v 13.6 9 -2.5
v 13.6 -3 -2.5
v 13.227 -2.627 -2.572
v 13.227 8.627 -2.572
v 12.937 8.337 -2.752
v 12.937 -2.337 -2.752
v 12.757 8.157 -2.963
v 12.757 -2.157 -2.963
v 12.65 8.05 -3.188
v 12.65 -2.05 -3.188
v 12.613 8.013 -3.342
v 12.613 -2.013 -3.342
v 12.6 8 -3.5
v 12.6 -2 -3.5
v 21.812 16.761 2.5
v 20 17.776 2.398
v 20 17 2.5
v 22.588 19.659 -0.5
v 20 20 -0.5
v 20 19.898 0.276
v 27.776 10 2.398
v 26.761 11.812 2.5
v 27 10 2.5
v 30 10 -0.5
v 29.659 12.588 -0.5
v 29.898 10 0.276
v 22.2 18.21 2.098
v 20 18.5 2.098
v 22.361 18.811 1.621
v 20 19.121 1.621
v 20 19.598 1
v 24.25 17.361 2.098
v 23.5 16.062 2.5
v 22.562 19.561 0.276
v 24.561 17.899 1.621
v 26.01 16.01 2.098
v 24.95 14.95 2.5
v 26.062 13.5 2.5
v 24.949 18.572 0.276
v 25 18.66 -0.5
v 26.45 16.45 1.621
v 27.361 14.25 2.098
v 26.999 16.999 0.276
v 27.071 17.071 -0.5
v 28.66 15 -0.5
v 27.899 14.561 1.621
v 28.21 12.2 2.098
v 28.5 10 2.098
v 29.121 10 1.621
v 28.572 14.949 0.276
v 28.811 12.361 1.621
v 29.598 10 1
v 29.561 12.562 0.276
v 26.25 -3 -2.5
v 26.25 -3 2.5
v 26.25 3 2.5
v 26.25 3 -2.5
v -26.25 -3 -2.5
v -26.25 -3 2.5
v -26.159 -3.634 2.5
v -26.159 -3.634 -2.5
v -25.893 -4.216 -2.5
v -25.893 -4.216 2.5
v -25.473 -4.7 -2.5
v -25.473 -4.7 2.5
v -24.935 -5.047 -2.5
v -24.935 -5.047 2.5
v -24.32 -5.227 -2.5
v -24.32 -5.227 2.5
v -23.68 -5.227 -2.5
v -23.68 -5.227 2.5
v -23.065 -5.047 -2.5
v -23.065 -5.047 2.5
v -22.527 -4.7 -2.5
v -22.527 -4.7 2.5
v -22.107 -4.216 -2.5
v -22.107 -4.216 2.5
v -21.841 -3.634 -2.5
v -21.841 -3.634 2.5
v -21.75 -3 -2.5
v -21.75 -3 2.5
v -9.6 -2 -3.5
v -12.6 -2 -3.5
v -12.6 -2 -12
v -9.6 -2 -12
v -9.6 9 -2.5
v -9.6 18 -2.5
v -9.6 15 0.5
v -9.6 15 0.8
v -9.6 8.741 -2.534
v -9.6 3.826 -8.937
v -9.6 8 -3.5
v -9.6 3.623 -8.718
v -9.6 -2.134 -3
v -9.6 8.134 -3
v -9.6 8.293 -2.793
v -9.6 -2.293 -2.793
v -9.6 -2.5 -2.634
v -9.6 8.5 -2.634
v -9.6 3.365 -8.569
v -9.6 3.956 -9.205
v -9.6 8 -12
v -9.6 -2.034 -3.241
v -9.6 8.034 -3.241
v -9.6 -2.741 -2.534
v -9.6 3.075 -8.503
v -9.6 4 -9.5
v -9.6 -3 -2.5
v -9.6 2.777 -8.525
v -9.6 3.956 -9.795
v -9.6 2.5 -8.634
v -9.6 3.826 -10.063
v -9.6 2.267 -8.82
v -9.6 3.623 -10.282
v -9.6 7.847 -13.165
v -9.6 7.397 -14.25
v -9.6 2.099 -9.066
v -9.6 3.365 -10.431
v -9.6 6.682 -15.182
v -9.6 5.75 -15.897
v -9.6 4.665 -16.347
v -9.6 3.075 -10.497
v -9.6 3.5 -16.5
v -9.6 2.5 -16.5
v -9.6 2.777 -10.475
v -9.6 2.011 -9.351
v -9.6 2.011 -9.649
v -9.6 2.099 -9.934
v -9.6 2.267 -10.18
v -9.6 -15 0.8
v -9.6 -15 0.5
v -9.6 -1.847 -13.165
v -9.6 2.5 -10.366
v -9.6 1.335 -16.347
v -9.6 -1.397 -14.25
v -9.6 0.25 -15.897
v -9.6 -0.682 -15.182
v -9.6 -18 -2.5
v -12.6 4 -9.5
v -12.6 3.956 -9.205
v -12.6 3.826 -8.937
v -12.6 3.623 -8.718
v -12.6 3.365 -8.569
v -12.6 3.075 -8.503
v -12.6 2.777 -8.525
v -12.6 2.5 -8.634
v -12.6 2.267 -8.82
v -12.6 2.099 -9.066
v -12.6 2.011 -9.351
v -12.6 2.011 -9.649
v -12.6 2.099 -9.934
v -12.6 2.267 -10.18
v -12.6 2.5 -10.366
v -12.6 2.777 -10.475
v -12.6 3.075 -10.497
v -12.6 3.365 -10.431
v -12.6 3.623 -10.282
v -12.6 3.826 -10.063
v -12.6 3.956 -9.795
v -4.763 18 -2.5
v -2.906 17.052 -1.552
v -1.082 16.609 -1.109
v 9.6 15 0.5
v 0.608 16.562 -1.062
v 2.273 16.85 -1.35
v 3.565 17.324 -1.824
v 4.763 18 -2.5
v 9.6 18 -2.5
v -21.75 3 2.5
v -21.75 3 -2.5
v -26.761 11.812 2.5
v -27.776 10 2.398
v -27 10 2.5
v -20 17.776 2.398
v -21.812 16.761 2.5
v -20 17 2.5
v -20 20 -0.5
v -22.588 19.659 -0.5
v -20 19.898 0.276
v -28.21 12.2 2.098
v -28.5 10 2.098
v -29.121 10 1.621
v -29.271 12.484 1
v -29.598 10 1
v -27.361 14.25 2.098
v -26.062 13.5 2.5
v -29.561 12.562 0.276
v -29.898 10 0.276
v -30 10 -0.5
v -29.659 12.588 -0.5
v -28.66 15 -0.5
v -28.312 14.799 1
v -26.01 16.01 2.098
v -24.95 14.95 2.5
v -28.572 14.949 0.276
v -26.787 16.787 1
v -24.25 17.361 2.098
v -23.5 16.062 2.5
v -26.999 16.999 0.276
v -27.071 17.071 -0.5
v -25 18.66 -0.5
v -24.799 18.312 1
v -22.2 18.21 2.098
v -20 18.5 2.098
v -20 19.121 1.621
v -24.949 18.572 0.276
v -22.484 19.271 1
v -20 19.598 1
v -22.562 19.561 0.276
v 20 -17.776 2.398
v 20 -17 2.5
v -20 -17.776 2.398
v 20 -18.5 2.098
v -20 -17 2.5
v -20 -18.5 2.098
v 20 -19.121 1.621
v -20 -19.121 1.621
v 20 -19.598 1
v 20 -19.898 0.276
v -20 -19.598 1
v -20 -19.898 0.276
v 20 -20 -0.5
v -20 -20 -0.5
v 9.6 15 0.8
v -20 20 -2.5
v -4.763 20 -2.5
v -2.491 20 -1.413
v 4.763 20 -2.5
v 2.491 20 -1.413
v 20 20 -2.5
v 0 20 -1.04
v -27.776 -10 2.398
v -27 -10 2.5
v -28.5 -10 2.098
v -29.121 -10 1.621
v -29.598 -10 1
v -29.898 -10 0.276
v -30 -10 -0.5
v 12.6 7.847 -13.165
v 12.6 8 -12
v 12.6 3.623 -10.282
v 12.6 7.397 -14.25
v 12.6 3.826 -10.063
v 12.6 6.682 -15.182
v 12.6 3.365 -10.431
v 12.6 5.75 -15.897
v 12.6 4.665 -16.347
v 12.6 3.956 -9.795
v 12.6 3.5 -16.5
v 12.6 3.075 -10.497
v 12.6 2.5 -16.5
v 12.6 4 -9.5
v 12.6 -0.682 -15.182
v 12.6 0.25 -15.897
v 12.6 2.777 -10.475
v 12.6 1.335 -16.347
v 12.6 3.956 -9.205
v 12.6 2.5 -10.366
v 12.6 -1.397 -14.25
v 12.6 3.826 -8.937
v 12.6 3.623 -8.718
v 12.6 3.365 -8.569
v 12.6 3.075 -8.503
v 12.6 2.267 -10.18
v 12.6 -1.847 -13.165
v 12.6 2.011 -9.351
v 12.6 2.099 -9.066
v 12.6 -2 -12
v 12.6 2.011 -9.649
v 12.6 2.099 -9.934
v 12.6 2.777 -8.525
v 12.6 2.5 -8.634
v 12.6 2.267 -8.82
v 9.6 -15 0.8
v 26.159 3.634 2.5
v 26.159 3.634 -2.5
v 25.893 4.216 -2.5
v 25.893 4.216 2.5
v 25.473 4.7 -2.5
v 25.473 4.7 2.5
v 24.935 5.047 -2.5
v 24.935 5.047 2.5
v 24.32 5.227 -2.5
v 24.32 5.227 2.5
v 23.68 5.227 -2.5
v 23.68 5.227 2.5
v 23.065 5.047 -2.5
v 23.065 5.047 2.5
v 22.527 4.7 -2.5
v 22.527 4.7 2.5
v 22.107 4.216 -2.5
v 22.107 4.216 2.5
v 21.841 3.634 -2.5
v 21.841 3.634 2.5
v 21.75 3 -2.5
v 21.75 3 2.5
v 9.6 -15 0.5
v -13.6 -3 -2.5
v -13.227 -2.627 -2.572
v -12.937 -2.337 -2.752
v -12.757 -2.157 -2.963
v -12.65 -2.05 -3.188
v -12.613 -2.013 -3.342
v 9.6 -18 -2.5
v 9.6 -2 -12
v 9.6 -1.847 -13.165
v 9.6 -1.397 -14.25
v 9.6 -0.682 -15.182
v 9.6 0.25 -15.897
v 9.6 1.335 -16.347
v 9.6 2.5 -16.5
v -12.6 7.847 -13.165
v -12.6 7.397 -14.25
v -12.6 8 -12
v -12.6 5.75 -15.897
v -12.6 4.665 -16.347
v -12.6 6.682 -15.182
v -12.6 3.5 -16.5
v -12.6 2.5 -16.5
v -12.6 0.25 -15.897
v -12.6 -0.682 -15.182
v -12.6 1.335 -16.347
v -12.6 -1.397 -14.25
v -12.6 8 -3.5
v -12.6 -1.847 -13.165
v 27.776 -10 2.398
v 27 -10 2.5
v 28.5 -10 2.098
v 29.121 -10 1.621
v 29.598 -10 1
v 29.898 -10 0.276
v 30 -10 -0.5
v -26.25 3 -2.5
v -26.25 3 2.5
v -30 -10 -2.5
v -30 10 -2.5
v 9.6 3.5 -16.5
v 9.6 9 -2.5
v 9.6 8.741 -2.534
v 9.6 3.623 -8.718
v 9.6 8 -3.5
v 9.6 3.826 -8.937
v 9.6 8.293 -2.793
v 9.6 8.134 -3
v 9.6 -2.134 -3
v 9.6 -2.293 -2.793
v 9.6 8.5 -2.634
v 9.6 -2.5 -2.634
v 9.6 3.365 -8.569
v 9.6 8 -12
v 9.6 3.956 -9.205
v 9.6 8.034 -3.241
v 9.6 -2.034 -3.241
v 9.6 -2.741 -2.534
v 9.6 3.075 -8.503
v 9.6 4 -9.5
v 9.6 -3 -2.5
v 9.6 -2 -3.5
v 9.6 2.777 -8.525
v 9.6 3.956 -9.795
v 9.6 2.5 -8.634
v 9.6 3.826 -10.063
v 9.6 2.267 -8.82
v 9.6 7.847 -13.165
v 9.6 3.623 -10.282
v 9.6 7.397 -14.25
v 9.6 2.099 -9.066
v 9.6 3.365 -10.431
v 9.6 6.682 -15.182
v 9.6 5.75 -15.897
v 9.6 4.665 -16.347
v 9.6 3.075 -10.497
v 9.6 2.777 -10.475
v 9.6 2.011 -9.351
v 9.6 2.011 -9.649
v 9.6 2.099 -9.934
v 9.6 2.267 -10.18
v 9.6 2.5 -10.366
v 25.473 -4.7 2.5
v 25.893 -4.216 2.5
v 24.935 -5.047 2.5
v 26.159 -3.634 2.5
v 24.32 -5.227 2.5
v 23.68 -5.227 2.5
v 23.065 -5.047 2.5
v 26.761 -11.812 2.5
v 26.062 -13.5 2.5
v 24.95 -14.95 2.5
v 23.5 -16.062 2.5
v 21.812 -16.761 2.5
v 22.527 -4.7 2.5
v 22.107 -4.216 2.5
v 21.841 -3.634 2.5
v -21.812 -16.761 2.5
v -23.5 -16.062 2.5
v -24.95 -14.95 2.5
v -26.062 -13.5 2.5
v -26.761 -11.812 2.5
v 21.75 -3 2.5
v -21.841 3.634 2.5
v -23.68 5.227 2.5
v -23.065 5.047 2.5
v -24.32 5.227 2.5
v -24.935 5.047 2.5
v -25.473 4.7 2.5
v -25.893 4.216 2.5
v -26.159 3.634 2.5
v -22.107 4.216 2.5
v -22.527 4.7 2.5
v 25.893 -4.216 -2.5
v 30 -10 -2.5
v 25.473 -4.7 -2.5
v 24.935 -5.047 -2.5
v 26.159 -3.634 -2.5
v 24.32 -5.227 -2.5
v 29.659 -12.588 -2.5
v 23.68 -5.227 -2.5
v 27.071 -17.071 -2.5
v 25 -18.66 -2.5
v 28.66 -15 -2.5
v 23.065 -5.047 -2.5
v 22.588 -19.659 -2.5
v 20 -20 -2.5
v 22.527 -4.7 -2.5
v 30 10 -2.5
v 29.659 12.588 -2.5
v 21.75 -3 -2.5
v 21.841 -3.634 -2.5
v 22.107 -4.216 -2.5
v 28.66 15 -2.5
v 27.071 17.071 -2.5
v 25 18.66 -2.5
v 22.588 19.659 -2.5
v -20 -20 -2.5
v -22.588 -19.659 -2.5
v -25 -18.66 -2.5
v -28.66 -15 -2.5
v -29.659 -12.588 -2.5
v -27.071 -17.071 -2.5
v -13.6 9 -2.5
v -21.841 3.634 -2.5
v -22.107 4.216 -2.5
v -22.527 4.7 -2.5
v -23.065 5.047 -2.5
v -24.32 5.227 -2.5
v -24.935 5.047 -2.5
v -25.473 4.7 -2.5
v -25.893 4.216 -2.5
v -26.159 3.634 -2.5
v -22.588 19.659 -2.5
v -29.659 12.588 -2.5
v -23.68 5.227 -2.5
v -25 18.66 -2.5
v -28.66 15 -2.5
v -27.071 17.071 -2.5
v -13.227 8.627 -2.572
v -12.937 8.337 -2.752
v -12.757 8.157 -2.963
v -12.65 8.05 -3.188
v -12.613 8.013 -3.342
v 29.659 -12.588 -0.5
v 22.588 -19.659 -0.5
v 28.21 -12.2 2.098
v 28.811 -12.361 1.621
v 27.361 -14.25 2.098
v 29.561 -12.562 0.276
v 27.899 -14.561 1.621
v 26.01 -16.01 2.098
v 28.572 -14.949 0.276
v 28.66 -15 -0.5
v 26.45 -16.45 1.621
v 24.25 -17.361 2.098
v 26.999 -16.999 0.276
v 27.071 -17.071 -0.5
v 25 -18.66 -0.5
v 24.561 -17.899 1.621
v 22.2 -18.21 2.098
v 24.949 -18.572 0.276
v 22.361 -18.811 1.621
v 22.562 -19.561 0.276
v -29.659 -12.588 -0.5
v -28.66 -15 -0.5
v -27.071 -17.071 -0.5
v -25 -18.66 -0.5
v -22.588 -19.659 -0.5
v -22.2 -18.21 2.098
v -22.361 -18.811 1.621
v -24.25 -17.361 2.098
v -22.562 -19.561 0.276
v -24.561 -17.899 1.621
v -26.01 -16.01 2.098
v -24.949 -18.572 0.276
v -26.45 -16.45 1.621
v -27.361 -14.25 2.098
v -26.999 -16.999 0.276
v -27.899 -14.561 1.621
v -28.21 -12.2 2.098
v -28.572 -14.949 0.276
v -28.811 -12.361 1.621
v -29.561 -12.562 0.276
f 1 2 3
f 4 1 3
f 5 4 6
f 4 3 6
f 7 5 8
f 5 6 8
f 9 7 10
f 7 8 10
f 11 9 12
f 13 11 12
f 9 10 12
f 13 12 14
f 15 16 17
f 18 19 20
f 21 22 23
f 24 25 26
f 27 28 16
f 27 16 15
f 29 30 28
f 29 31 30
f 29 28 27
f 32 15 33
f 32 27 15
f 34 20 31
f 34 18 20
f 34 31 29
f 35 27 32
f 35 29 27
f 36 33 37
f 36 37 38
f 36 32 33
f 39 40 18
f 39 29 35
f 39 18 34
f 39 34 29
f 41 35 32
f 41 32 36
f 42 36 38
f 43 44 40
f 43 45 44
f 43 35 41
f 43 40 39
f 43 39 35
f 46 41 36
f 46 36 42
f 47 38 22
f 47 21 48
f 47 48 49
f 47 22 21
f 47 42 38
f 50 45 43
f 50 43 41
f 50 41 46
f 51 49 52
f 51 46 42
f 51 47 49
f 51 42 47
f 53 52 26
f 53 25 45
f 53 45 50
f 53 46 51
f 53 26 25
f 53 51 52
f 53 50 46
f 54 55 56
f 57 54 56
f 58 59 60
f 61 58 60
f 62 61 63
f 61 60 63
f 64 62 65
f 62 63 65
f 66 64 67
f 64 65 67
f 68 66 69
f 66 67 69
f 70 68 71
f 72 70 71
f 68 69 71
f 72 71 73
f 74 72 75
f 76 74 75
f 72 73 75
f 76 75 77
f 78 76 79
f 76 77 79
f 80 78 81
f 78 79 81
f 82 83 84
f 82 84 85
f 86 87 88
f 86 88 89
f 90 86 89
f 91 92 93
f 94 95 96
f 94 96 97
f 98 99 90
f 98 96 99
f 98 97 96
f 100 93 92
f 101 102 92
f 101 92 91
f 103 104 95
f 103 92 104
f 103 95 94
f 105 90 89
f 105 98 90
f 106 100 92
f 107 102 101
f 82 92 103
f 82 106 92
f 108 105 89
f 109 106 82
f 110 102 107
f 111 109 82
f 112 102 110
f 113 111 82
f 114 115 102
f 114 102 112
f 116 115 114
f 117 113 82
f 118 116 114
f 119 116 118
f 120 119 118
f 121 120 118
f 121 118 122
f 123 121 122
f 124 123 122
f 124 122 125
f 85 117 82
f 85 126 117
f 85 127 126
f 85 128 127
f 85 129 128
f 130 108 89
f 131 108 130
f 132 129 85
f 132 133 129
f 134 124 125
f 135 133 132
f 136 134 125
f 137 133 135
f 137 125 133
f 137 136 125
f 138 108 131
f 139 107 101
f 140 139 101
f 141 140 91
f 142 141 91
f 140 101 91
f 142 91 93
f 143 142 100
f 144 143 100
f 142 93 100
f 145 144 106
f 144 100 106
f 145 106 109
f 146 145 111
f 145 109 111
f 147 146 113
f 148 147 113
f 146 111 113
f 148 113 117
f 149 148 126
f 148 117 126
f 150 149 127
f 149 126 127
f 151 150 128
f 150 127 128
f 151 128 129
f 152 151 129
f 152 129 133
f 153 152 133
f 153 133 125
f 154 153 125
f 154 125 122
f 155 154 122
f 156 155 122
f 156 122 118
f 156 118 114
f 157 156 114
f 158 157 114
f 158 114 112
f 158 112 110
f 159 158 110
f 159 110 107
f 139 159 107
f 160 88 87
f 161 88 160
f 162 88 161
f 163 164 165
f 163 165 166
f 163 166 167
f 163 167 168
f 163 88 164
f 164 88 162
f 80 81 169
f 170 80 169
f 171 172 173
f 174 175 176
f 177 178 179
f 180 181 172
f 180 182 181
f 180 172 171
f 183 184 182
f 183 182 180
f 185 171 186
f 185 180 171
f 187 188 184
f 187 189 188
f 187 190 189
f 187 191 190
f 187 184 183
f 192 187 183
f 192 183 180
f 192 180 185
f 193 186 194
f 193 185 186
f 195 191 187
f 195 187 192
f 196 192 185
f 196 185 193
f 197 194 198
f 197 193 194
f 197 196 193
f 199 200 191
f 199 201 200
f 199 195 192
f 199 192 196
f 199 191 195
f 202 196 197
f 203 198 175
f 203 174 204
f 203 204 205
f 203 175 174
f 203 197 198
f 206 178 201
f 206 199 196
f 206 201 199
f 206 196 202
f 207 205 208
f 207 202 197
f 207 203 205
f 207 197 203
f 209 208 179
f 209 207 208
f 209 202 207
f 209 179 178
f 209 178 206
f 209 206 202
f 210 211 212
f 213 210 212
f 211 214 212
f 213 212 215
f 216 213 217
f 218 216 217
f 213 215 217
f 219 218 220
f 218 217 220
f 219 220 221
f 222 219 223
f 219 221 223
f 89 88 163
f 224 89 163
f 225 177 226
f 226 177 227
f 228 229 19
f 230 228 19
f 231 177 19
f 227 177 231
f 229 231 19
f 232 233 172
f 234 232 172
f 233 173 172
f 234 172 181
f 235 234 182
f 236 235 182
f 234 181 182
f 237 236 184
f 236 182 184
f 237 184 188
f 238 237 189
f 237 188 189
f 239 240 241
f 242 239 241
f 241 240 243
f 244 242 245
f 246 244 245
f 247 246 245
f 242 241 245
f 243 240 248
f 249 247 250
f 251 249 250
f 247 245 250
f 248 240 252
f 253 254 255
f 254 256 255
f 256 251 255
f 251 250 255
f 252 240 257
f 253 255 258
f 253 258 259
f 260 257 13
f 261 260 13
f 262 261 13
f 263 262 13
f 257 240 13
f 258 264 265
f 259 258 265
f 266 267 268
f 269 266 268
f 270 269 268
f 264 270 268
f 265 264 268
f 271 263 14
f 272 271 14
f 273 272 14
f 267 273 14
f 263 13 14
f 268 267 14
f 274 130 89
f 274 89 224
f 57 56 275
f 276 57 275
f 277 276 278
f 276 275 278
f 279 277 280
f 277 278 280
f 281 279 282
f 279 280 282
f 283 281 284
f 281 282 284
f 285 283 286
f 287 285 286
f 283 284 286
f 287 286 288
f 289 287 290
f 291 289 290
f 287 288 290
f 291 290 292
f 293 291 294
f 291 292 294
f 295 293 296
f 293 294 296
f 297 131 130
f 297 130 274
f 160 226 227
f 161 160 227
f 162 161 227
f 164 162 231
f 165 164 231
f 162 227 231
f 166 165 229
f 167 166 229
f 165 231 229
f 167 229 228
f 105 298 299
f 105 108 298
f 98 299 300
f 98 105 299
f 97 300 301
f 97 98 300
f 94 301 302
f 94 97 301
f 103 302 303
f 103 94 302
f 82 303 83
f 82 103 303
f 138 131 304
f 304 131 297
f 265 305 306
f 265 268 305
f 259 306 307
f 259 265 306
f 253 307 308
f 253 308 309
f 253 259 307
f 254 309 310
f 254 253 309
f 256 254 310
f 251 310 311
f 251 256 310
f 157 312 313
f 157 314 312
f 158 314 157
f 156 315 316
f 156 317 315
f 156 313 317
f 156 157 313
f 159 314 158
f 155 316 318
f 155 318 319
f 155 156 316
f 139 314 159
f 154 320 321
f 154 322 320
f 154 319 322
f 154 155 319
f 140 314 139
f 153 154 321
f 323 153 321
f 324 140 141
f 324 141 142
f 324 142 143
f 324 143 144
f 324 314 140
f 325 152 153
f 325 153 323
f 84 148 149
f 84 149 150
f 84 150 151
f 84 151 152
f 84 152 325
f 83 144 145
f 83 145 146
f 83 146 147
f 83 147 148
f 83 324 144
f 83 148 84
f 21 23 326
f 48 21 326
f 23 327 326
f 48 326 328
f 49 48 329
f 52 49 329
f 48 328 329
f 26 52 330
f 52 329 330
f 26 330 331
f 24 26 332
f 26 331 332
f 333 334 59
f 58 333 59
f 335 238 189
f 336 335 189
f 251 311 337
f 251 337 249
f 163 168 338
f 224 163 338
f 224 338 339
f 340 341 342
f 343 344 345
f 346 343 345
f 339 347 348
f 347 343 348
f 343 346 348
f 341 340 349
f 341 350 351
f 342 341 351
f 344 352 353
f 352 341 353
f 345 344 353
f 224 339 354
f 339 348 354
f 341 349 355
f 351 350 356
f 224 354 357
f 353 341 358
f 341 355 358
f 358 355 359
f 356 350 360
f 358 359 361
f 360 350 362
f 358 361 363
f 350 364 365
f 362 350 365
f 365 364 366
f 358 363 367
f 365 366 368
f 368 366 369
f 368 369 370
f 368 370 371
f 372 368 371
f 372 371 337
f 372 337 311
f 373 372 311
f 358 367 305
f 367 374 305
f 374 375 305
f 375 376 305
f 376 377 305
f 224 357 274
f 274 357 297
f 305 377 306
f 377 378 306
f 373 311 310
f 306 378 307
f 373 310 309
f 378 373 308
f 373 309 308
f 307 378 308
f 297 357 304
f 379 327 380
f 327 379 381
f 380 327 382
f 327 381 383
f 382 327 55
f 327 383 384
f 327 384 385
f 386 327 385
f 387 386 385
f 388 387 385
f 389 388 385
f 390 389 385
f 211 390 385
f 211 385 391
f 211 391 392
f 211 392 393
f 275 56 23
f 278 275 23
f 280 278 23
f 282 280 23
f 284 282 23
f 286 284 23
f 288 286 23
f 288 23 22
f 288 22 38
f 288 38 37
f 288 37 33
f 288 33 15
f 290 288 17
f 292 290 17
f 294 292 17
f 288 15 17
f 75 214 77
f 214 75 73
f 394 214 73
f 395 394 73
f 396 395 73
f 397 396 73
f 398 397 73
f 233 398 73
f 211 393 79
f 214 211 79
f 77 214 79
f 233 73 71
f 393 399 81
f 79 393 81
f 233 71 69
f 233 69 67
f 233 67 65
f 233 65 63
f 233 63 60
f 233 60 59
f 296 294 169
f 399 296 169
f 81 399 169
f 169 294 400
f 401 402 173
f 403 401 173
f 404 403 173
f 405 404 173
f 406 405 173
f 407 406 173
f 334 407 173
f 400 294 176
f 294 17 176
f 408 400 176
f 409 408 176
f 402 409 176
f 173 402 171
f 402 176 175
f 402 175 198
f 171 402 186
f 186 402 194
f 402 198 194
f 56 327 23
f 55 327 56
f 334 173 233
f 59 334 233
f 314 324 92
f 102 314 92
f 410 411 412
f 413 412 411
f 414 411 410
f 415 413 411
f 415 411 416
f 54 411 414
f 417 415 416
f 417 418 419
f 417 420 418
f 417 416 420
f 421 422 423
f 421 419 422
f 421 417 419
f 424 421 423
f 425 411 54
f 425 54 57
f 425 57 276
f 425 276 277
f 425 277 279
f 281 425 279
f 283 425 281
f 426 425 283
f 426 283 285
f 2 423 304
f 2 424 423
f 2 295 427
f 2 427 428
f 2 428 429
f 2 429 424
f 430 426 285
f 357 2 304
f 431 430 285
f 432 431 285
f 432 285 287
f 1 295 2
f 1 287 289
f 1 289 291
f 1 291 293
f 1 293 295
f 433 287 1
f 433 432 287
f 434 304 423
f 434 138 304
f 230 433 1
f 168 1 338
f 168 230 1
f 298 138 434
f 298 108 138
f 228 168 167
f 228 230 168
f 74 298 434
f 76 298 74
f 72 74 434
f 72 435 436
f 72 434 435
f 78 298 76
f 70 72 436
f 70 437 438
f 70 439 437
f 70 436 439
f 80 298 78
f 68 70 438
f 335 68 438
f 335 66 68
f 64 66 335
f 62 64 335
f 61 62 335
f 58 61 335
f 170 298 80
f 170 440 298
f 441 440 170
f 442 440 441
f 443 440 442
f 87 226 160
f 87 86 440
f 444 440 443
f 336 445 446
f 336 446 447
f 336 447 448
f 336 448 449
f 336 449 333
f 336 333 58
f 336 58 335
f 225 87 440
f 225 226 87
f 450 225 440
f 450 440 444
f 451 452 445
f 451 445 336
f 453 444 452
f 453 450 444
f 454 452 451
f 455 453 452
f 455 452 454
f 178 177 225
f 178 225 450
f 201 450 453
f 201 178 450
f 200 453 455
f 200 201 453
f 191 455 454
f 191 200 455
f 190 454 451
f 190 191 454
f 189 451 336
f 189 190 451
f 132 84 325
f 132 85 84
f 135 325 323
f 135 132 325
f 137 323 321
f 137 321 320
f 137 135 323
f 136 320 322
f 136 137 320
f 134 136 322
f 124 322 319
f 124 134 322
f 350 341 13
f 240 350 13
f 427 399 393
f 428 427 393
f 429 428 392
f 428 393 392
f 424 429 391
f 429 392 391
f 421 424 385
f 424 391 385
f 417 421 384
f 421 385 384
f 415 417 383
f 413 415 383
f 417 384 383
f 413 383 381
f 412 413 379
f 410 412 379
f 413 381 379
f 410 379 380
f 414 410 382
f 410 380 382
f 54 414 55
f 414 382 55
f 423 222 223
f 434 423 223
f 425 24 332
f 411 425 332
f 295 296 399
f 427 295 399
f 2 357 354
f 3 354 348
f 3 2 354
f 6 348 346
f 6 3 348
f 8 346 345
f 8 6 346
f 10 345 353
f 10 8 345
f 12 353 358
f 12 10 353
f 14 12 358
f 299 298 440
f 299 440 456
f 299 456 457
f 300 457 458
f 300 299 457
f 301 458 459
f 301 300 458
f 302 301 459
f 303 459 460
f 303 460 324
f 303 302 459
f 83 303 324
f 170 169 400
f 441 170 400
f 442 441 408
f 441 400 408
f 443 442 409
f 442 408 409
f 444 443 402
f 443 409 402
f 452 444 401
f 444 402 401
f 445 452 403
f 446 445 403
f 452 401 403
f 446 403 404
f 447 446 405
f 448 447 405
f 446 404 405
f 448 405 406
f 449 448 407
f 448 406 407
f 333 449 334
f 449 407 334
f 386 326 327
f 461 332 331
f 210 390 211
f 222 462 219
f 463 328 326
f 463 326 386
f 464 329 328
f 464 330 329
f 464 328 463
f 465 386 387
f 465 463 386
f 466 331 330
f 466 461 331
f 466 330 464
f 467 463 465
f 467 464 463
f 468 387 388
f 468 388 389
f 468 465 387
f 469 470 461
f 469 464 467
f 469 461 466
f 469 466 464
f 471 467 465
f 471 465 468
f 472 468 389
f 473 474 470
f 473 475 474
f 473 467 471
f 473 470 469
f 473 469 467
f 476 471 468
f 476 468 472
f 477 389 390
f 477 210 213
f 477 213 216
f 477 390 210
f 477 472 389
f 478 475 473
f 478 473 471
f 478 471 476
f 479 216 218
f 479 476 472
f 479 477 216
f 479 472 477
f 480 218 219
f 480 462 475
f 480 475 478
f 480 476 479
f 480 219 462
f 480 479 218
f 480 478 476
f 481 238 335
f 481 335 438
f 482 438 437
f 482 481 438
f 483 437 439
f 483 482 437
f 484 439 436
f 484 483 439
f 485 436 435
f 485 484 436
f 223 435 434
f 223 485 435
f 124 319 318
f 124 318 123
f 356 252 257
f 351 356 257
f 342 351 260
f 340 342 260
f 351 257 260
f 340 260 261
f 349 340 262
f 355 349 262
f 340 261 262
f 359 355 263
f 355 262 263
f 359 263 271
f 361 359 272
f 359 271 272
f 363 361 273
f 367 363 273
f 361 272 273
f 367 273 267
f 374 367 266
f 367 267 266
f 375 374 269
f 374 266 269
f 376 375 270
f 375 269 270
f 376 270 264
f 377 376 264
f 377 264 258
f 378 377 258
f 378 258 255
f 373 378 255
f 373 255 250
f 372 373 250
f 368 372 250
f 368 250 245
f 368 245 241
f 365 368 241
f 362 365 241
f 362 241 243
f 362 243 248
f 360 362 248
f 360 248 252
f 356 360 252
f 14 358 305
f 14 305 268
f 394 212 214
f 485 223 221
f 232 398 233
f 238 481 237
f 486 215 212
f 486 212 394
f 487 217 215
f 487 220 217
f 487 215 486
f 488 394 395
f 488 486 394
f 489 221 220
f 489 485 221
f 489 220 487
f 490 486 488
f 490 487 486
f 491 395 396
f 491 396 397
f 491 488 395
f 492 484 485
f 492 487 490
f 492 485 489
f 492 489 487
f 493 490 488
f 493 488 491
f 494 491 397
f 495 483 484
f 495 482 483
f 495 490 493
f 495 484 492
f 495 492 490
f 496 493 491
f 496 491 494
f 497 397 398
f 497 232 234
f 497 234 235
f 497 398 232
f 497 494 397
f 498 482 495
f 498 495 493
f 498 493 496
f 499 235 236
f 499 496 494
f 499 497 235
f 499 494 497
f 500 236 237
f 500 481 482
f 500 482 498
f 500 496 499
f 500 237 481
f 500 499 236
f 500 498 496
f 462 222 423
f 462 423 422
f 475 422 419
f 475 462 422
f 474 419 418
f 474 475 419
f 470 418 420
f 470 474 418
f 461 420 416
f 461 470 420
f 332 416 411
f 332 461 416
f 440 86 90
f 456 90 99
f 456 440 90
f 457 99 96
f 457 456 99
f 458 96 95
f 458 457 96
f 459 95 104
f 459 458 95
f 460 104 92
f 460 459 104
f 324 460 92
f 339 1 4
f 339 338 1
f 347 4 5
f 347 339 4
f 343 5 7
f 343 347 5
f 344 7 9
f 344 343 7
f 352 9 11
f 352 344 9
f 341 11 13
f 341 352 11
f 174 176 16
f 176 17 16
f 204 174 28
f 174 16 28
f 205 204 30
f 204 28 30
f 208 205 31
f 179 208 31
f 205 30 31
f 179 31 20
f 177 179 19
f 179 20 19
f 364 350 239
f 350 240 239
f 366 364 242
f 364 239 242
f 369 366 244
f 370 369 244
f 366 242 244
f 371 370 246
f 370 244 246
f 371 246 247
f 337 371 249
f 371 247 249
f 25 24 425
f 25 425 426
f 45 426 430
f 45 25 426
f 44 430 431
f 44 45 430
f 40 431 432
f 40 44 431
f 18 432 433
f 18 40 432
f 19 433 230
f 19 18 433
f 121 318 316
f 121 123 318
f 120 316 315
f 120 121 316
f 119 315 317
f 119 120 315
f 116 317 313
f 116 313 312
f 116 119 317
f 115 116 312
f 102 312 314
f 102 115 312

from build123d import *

# Parameters (mm, degrees)
PAD_DEPTH       = 2.5
SKETCH001_W     = 19.2
SKETCH001_H     = 30
POCKET_DEPTH    = 3.3
SKETCH002_W     = 3
SKETCH002_H     = 10
PAD001_DEPTH    = 14
POCKET004_DEPTH = 5
SKETCH005_R     = 1
POCKET005_DEPTH = 26
CHAMFER_SIZE    = 3
FILLET_R        = 1
FILLET001_R     = 1
FILLET002_R     = 1
FILLET003_R     = 3
SKETCH007_R     = 8.5
POCKET006_DEPTH = 5
FILLET004_R     = 4.5


with BuildPart() as part:
    # Sketch → Pad (new body, symmetric)
    with BuildSketch(Plane.XY):
        with BuildLine():
            Line((-20, 20), (20, 20))
            ThreePointArc((30, 10), (27.071068, 17.071068), (20, 20))
            Line((30, 10), (30, -10))
            ThreePointArc((20, -20), (27.071068, -17.071068), (30, -10))
            Line((20, -20), (-20, -20))
            ThreePointArc((-30, -10), (-27.071068, -17.071068), (-20, -20))
            Line((-30, -10), (-30, 10))
            ThreePointArc((-20, 20), (-27.071068, 17.071068), (-30, 10))
        make_face()
    extrude(amount=PAD_DEPTH, both=True)

    # Sketch001 → Pocket (cut)
    with BuildSketch(Plane(origin=(0, 0, -2.5), x_dir=(1, 0, 0), z_dir=(0, 0, -1))):
        Rectangle(SKETCH001_W, SKETCH001_H)
    extrude(amount=-POCKET_DEPTH, mode=Mode.SUBTRACT)

    # Sketch002 (on Face4 of Pocket) → Pad001 (join)
    with BuildSketch(Plane(origin=(0, 0, -2.5), x_dir=(1, 0, 0), z_dir=(0, 0, -1))):
        with Locations((11.1, -3)):
            Rectangle(SKETCH002_W, SKETCH002_H)
        with Locations((-11.1, -3)):
            Rectangle(SKETCH002_W, SKETCH002_H)
    extrude(amount=PAD001_DEPTH)

    # Sketch004 → Pocket004 (cut)
    with BuildSketch(Plane.XY.offset(2.5)):
        with BuildLine():
            ThreePointArc((-21.75, 3), (-24, 5.25), (-26.25, 3))
            Line((-26.25, 3), (-26.25, -3))
            ThreePointArc((-26.25, -3), (-24, -5.25), (-21.75, -3))
            Line((-21.75, -3), (-21.75, 3))
        make_face()
        with BuildLine():
            ThreePointArc((26.25, 3), (24, 5.25), (21.75, 3))
            Line((21.75, 3), (21.75, -3))
            ThreePointArc((21.75, -3), (24, -5.25), (26.25, -3))
            Line((26.25, -3), (26.25, 3))
        make_face()
    extrude(amount=-POCKET004_DEPTH, mode=Mode.SUBTRACT)

    # Sketch005 (on Face21 of Pocket004) → Pocket005 (cut)
    with BuildSketch(Plane.YZ.offset(12.6)):
        with Locations((3, -9.5)):
            Circle(SKETCH005_R)
    extrude(amount=-POCKET005_DEPTH, mode=Mode.SUBTRACT)

    # Chamfer
    chamfer_edges = [part.edges().sort_by_distance(p)[0] for p in [
        (0, -15, -2.5),
        (0, 15, -2.5),
    ]]
    chamfer(chamfer_edges, length=CHAMFER_SIZE)

    # Fillet
    fillet_edges = [part.edges().sort_by_distance(p)[0] for p in [
        (-12.6, 3, -2.5),
    ]]
    fillet(fillet_edges, radius=FILLET_R)

    # Fillet001
    fillet001_edges = [part.edges().sort_by_distance(p)[0] for p in [
        (12.6, 3, -2.5),
    ]]
    fillet(fillet001_edges, radius=FILLET001_R)

    # Fillet002
    fillet002_edges = [part.edges().sort_by_distance(p)[0] for p in [
        (11.1, -2, -2.5),
        (-11.1, -2, -2.5),
        (11.1, 8, -2.5),
        (-11.1, 8, -2.5),
    ]]
    fillet(fillet002_edges, radius=FILLET002_R)

    # Fillet003
    fillet003_edges = [part.edges().sort_by_distance(p)[0] for p in [
        (0, 20, 2.5),
        (27.071068, 17.071068, 2.5),
        (30, 0, 2.5),
        (27.071068, -17.071068, 2.5),
        (0, -20, 2.5),
        (-27.071068, -17.071068, 2.5),
        (-30, 0, 2.5),
        (-27.071068, 17.071068, 2.5),
    ]]
    fillet(fillet003_edges, radius=FILLET003_R)

    # Sketch007 (on Face20 of Fillet003) → Pocket006 (cut)
    with BuildSketch(Plane(origin=(0, 20, 0), x_dir=(-1, 0, 0), z_dir=(0, 1, 0))):
        with Locations((0, -9.54)):
            Circle(SKETCH007_R)
    extrude(amount=-POCKET006_DEPTH, mode=Mode.SUBTRACT)

    # Fillet004
    fillet004_edges = [part.edges().sort_by_distance(p)[0] for p in [
        (-11.1, 8, -16.5),
        (-11.1, -2, -16.5),
        (11.1, -2, -16.5),
        (11.1, 8, -16.5),
    ]]
    fillet(fillet004_edges, radius=FILLET004_R)


solid = part.part
